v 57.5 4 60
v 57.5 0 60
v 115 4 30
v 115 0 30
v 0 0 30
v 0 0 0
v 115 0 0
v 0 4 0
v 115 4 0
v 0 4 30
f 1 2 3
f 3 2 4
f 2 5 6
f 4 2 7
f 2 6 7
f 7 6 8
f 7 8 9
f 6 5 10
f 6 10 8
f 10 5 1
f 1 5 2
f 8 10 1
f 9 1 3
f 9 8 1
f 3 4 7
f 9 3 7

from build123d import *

# Parameters (mm, degrees)
SKETCH1_W           = 115
SKETCH1_H           = 30
BOSS_EXTRUDE1_DEPTH = 4


with BuildPart() as part:
    # Sketch1 → Boss-Extrude1 (new body)
    with BuildSketch(Plane(origin=(0, 0, 0), x_dir=(1, 0, 0), z_dir=(0, 1, 0))):
        Polygon((57.5, -30), (0, -30), (57.5, -60), align=None)
        with Locations((57.5, -15)):
            Rectangle(SKETCH1_W, SKETCH1_H)
        Polygon((57.5, -30), (57.5, -60), (115, -30), align=None)
    extrude(amount=BOSS_EXTRUDE1_DEPTH)


solid = part.part
